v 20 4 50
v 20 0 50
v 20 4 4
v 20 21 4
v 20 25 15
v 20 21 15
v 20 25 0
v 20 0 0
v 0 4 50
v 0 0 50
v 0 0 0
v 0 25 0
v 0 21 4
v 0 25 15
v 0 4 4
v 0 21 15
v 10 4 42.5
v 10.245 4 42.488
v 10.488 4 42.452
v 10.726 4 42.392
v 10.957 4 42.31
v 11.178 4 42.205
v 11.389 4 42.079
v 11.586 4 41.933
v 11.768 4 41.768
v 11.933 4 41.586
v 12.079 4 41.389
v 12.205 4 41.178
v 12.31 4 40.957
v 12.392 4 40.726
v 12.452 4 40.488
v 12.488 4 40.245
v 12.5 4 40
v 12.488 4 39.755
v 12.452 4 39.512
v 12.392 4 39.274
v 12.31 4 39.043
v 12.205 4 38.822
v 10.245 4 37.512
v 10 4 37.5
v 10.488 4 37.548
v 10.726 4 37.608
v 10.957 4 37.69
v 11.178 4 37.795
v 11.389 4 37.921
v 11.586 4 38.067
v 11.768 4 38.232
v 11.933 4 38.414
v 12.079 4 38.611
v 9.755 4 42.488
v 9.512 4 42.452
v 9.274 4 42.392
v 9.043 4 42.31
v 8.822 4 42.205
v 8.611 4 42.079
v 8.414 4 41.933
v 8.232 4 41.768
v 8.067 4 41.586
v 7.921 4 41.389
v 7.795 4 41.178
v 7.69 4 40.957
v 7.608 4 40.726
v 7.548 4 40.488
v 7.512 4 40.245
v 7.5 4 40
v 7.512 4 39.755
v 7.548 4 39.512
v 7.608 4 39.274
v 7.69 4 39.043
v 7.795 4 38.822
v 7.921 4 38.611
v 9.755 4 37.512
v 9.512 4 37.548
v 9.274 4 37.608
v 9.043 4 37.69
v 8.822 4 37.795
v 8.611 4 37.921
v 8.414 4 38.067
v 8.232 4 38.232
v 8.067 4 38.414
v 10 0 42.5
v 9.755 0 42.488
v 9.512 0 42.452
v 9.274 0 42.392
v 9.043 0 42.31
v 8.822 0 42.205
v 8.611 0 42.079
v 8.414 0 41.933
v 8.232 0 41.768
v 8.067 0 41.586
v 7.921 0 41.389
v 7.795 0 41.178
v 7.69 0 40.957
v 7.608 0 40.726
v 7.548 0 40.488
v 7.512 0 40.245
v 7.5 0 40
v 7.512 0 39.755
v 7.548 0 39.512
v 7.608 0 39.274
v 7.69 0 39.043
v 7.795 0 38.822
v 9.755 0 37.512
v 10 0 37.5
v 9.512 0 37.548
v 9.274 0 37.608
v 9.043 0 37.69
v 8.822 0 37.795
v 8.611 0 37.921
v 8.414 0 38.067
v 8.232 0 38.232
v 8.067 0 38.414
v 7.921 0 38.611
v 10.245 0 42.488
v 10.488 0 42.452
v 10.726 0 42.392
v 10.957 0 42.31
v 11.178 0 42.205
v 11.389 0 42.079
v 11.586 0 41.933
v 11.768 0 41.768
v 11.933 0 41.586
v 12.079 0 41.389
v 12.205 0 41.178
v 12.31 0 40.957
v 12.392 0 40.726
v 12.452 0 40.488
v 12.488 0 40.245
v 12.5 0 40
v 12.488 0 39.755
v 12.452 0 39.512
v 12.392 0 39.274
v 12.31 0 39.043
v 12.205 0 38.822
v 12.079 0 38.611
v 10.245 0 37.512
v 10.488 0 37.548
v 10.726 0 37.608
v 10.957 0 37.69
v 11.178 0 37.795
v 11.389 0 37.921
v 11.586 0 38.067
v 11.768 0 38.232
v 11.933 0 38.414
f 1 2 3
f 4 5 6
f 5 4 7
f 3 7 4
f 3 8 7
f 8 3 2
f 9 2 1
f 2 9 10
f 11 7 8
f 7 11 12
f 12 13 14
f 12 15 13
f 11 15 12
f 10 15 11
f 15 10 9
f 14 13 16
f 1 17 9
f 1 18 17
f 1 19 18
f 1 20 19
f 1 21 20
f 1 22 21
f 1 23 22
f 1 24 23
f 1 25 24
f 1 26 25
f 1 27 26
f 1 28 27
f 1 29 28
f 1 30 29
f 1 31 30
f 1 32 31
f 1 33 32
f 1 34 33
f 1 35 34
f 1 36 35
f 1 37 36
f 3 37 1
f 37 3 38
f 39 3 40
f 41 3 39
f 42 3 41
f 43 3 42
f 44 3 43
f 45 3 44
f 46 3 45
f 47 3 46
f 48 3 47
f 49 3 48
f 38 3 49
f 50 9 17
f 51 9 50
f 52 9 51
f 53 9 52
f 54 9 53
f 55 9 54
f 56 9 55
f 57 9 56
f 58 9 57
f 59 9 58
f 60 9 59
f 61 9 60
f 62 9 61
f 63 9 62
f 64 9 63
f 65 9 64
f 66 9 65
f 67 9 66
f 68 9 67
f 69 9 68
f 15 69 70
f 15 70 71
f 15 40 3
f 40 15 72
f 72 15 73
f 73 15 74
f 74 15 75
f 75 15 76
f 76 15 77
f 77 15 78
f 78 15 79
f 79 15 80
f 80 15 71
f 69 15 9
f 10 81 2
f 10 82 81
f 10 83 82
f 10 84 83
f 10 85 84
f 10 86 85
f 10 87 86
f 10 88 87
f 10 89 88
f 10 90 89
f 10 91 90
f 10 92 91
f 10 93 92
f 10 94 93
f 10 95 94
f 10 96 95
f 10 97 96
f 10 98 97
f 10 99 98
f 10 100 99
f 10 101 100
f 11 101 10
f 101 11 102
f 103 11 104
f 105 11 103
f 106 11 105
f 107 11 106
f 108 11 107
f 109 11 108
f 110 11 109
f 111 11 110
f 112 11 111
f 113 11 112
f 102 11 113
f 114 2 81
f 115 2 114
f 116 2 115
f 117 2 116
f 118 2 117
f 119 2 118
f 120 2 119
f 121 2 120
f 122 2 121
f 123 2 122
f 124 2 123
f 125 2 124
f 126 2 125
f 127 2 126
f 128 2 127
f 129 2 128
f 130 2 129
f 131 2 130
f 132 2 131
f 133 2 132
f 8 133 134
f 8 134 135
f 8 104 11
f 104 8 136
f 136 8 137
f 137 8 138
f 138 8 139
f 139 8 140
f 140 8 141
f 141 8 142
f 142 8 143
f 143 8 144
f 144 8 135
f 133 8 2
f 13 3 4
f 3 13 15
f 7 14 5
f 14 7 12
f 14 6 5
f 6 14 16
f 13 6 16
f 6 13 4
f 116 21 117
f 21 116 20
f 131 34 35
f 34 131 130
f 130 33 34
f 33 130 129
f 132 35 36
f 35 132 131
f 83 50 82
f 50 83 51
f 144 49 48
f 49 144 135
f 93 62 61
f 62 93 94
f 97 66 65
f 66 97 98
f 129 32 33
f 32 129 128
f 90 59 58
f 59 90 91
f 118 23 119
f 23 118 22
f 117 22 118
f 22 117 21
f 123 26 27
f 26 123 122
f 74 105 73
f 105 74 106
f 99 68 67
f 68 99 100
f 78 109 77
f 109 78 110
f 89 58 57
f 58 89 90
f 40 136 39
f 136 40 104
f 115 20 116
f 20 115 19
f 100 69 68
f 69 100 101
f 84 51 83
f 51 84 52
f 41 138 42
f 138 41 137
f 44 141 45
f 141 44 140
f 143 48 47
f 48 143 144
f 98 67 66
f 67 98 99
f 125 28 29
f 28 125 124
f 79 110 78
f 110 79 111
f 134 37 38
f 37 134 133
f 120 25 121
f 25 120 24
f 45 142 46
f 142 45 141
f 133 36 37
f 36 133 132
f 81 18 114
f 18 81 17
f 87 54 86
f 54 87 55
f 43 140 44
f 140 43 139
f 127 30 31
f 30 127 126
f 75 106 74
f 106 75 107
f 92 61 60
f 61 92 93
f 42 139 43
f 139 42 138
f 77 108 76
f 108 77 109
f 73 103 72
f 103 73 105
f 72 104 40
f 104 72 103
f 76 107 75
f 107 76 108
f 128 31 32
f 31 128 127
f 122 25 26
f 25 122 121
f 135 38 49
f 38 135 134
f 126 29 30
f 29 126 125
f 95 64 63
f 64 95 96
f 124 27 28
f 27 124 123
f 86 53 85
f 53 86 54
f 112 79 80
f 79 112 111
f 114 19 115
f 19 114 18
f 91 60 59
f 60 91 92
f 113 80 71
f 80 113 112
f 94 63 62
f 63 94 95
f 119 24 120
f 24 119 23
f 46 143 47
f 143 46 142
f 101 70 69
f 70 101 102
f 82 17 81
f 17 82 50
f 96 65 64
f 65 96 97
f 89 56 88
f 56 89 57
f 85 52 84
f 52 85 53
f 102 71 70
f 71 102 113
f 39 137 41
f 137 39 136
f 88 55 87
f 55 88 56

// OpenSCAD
// Hand-written sample for testing the pipeline without Claude:
//   python spikes/generate_spike.py --scad spikes/sample_hook.scad
width = 20;       // hook width (mm)
thickness = 4;    // plate thickness (mm)
height = 50;      // back plate height (mm)
hook_depth = 25;  // how far the hook sticks out (mm)
lip = 15;         // height of the front lip (mm)
screw_d = 5;      // screw hole diameter (mm)
$fn = 64;

difference() {
  union() {
    cube([width, thickness, height]);                                  // back plate
    cube([width, hook_depth, thickness]);                              // bottom arm
    translate([0, hook_depth - thickness, 0]) cube([width, thickness, lip]);  // front lip
  }
  translate([width / 2, -1, height - 10]) rotate([-90, 0, 0])
    cylinder(d = screw_d, h = thickness + 2);                          // screw hole
}
